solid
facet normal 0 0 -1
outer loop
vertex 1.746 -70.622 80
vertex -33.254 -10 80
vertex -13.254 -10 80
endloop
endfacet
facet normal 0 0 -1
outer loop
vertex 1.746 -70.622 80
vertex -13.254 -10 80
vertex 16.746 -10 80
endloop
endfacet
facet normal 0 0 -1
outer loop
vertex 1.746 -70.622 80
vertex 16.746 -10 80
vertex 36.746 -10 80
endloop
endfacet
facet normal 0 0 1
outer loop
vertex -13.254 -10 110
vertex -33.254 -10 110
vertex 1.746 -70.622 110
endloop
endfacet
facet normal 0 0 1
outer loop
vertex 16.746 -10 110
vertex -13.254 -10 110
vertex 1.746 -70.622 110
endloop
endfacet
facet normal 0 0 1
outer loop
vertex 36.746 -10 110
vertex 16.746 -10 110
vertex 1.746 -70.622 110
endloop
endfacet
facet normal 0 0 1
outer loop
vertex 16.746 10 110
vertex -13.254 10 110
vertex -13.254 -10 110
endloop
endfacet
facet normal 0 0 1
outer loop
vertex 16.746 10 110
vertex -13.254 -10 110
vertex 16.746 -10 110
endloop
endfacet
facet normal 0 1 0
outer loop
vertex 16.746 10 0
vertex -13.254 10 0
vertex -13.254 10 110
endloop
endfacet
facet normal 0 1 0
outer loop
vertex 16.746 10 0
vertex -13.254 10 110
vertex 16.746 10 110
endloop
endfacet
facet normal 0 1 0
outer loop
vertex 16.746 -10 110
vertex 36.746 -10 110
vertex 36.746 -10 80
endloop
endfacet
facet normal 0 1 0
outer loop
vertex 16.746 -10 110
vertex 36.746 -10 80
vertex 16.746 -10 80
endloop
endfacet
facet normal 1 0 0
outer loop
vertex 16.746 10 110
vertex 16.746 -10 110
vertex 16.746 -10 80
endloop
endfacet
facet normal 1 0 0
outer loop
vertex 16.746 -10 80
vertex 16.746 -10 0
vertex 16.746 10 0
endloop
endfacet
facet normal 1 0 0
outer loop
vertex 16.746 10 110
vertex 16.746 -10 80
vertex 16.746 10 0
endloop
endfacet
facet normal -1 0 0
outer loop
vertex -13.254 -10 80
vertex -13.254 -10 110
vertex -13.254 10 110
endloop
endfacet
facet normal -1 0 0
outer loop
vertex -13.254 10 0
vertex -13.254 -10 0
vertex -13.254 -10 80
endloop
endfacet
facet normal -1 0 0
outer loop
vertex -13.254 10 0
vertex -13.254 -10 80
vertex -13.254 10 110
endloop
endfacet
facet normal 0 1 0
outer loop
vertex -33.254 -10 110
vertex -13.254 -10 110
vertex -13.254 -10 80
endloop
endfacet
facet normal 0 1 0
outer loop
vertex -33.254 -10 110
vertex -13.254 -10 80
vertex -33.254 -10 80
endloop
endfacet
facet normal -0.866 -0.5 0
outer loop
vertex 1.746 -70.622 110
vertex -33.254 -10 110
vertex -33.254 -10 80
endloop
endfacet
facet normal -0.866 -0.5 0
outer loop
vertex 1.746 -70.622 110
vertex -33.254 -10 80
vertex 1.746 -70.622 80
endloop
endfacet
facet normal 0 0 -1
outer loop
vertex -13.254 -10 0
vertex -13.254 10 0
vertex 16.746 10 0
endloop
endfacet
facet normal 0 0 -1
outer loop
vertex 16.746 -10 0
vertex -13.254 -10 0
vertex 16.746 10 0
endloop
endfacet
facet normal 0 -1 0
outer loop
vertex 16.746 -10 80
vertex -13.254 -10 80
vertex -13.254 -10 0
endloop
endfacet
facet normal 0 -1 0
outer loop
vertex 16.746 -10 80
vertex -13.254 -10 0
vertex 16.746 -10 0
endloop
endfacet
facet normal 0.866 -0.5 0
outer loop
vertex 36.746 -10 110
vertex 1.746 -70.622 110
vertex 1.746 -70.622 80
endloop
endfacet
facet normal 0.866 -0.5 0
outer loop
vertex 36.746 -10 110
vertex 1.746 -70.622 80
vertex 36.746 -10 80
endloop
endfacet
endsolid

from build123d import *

# Parameters (mm, degrees)
F0_W     = 30
F0_H     = 20
F3_DEPTH = 110
F4_DEPTH = 30


with BuildPart() as f3:
    # F0 (on Top) → F3 (new body)
    with BuildSketch(Plane.XY):
        with Locations((1.746466, 0)):
            Rectangle(F0_W, F0_H)
    extrude(amount=F3_DEPTH)

    # F2 (on offset) → F4 (join)
    with BuildSketch(Plane.XY.offset(110)):
        Polygon((16.746466, -10), (-13.253534, -10), (-33.253534, -10), (1.746466, -70.621778), (36.746466, -10), align=None)
    extrude(amount=-F4_DEPTH)


solid = f3.part
